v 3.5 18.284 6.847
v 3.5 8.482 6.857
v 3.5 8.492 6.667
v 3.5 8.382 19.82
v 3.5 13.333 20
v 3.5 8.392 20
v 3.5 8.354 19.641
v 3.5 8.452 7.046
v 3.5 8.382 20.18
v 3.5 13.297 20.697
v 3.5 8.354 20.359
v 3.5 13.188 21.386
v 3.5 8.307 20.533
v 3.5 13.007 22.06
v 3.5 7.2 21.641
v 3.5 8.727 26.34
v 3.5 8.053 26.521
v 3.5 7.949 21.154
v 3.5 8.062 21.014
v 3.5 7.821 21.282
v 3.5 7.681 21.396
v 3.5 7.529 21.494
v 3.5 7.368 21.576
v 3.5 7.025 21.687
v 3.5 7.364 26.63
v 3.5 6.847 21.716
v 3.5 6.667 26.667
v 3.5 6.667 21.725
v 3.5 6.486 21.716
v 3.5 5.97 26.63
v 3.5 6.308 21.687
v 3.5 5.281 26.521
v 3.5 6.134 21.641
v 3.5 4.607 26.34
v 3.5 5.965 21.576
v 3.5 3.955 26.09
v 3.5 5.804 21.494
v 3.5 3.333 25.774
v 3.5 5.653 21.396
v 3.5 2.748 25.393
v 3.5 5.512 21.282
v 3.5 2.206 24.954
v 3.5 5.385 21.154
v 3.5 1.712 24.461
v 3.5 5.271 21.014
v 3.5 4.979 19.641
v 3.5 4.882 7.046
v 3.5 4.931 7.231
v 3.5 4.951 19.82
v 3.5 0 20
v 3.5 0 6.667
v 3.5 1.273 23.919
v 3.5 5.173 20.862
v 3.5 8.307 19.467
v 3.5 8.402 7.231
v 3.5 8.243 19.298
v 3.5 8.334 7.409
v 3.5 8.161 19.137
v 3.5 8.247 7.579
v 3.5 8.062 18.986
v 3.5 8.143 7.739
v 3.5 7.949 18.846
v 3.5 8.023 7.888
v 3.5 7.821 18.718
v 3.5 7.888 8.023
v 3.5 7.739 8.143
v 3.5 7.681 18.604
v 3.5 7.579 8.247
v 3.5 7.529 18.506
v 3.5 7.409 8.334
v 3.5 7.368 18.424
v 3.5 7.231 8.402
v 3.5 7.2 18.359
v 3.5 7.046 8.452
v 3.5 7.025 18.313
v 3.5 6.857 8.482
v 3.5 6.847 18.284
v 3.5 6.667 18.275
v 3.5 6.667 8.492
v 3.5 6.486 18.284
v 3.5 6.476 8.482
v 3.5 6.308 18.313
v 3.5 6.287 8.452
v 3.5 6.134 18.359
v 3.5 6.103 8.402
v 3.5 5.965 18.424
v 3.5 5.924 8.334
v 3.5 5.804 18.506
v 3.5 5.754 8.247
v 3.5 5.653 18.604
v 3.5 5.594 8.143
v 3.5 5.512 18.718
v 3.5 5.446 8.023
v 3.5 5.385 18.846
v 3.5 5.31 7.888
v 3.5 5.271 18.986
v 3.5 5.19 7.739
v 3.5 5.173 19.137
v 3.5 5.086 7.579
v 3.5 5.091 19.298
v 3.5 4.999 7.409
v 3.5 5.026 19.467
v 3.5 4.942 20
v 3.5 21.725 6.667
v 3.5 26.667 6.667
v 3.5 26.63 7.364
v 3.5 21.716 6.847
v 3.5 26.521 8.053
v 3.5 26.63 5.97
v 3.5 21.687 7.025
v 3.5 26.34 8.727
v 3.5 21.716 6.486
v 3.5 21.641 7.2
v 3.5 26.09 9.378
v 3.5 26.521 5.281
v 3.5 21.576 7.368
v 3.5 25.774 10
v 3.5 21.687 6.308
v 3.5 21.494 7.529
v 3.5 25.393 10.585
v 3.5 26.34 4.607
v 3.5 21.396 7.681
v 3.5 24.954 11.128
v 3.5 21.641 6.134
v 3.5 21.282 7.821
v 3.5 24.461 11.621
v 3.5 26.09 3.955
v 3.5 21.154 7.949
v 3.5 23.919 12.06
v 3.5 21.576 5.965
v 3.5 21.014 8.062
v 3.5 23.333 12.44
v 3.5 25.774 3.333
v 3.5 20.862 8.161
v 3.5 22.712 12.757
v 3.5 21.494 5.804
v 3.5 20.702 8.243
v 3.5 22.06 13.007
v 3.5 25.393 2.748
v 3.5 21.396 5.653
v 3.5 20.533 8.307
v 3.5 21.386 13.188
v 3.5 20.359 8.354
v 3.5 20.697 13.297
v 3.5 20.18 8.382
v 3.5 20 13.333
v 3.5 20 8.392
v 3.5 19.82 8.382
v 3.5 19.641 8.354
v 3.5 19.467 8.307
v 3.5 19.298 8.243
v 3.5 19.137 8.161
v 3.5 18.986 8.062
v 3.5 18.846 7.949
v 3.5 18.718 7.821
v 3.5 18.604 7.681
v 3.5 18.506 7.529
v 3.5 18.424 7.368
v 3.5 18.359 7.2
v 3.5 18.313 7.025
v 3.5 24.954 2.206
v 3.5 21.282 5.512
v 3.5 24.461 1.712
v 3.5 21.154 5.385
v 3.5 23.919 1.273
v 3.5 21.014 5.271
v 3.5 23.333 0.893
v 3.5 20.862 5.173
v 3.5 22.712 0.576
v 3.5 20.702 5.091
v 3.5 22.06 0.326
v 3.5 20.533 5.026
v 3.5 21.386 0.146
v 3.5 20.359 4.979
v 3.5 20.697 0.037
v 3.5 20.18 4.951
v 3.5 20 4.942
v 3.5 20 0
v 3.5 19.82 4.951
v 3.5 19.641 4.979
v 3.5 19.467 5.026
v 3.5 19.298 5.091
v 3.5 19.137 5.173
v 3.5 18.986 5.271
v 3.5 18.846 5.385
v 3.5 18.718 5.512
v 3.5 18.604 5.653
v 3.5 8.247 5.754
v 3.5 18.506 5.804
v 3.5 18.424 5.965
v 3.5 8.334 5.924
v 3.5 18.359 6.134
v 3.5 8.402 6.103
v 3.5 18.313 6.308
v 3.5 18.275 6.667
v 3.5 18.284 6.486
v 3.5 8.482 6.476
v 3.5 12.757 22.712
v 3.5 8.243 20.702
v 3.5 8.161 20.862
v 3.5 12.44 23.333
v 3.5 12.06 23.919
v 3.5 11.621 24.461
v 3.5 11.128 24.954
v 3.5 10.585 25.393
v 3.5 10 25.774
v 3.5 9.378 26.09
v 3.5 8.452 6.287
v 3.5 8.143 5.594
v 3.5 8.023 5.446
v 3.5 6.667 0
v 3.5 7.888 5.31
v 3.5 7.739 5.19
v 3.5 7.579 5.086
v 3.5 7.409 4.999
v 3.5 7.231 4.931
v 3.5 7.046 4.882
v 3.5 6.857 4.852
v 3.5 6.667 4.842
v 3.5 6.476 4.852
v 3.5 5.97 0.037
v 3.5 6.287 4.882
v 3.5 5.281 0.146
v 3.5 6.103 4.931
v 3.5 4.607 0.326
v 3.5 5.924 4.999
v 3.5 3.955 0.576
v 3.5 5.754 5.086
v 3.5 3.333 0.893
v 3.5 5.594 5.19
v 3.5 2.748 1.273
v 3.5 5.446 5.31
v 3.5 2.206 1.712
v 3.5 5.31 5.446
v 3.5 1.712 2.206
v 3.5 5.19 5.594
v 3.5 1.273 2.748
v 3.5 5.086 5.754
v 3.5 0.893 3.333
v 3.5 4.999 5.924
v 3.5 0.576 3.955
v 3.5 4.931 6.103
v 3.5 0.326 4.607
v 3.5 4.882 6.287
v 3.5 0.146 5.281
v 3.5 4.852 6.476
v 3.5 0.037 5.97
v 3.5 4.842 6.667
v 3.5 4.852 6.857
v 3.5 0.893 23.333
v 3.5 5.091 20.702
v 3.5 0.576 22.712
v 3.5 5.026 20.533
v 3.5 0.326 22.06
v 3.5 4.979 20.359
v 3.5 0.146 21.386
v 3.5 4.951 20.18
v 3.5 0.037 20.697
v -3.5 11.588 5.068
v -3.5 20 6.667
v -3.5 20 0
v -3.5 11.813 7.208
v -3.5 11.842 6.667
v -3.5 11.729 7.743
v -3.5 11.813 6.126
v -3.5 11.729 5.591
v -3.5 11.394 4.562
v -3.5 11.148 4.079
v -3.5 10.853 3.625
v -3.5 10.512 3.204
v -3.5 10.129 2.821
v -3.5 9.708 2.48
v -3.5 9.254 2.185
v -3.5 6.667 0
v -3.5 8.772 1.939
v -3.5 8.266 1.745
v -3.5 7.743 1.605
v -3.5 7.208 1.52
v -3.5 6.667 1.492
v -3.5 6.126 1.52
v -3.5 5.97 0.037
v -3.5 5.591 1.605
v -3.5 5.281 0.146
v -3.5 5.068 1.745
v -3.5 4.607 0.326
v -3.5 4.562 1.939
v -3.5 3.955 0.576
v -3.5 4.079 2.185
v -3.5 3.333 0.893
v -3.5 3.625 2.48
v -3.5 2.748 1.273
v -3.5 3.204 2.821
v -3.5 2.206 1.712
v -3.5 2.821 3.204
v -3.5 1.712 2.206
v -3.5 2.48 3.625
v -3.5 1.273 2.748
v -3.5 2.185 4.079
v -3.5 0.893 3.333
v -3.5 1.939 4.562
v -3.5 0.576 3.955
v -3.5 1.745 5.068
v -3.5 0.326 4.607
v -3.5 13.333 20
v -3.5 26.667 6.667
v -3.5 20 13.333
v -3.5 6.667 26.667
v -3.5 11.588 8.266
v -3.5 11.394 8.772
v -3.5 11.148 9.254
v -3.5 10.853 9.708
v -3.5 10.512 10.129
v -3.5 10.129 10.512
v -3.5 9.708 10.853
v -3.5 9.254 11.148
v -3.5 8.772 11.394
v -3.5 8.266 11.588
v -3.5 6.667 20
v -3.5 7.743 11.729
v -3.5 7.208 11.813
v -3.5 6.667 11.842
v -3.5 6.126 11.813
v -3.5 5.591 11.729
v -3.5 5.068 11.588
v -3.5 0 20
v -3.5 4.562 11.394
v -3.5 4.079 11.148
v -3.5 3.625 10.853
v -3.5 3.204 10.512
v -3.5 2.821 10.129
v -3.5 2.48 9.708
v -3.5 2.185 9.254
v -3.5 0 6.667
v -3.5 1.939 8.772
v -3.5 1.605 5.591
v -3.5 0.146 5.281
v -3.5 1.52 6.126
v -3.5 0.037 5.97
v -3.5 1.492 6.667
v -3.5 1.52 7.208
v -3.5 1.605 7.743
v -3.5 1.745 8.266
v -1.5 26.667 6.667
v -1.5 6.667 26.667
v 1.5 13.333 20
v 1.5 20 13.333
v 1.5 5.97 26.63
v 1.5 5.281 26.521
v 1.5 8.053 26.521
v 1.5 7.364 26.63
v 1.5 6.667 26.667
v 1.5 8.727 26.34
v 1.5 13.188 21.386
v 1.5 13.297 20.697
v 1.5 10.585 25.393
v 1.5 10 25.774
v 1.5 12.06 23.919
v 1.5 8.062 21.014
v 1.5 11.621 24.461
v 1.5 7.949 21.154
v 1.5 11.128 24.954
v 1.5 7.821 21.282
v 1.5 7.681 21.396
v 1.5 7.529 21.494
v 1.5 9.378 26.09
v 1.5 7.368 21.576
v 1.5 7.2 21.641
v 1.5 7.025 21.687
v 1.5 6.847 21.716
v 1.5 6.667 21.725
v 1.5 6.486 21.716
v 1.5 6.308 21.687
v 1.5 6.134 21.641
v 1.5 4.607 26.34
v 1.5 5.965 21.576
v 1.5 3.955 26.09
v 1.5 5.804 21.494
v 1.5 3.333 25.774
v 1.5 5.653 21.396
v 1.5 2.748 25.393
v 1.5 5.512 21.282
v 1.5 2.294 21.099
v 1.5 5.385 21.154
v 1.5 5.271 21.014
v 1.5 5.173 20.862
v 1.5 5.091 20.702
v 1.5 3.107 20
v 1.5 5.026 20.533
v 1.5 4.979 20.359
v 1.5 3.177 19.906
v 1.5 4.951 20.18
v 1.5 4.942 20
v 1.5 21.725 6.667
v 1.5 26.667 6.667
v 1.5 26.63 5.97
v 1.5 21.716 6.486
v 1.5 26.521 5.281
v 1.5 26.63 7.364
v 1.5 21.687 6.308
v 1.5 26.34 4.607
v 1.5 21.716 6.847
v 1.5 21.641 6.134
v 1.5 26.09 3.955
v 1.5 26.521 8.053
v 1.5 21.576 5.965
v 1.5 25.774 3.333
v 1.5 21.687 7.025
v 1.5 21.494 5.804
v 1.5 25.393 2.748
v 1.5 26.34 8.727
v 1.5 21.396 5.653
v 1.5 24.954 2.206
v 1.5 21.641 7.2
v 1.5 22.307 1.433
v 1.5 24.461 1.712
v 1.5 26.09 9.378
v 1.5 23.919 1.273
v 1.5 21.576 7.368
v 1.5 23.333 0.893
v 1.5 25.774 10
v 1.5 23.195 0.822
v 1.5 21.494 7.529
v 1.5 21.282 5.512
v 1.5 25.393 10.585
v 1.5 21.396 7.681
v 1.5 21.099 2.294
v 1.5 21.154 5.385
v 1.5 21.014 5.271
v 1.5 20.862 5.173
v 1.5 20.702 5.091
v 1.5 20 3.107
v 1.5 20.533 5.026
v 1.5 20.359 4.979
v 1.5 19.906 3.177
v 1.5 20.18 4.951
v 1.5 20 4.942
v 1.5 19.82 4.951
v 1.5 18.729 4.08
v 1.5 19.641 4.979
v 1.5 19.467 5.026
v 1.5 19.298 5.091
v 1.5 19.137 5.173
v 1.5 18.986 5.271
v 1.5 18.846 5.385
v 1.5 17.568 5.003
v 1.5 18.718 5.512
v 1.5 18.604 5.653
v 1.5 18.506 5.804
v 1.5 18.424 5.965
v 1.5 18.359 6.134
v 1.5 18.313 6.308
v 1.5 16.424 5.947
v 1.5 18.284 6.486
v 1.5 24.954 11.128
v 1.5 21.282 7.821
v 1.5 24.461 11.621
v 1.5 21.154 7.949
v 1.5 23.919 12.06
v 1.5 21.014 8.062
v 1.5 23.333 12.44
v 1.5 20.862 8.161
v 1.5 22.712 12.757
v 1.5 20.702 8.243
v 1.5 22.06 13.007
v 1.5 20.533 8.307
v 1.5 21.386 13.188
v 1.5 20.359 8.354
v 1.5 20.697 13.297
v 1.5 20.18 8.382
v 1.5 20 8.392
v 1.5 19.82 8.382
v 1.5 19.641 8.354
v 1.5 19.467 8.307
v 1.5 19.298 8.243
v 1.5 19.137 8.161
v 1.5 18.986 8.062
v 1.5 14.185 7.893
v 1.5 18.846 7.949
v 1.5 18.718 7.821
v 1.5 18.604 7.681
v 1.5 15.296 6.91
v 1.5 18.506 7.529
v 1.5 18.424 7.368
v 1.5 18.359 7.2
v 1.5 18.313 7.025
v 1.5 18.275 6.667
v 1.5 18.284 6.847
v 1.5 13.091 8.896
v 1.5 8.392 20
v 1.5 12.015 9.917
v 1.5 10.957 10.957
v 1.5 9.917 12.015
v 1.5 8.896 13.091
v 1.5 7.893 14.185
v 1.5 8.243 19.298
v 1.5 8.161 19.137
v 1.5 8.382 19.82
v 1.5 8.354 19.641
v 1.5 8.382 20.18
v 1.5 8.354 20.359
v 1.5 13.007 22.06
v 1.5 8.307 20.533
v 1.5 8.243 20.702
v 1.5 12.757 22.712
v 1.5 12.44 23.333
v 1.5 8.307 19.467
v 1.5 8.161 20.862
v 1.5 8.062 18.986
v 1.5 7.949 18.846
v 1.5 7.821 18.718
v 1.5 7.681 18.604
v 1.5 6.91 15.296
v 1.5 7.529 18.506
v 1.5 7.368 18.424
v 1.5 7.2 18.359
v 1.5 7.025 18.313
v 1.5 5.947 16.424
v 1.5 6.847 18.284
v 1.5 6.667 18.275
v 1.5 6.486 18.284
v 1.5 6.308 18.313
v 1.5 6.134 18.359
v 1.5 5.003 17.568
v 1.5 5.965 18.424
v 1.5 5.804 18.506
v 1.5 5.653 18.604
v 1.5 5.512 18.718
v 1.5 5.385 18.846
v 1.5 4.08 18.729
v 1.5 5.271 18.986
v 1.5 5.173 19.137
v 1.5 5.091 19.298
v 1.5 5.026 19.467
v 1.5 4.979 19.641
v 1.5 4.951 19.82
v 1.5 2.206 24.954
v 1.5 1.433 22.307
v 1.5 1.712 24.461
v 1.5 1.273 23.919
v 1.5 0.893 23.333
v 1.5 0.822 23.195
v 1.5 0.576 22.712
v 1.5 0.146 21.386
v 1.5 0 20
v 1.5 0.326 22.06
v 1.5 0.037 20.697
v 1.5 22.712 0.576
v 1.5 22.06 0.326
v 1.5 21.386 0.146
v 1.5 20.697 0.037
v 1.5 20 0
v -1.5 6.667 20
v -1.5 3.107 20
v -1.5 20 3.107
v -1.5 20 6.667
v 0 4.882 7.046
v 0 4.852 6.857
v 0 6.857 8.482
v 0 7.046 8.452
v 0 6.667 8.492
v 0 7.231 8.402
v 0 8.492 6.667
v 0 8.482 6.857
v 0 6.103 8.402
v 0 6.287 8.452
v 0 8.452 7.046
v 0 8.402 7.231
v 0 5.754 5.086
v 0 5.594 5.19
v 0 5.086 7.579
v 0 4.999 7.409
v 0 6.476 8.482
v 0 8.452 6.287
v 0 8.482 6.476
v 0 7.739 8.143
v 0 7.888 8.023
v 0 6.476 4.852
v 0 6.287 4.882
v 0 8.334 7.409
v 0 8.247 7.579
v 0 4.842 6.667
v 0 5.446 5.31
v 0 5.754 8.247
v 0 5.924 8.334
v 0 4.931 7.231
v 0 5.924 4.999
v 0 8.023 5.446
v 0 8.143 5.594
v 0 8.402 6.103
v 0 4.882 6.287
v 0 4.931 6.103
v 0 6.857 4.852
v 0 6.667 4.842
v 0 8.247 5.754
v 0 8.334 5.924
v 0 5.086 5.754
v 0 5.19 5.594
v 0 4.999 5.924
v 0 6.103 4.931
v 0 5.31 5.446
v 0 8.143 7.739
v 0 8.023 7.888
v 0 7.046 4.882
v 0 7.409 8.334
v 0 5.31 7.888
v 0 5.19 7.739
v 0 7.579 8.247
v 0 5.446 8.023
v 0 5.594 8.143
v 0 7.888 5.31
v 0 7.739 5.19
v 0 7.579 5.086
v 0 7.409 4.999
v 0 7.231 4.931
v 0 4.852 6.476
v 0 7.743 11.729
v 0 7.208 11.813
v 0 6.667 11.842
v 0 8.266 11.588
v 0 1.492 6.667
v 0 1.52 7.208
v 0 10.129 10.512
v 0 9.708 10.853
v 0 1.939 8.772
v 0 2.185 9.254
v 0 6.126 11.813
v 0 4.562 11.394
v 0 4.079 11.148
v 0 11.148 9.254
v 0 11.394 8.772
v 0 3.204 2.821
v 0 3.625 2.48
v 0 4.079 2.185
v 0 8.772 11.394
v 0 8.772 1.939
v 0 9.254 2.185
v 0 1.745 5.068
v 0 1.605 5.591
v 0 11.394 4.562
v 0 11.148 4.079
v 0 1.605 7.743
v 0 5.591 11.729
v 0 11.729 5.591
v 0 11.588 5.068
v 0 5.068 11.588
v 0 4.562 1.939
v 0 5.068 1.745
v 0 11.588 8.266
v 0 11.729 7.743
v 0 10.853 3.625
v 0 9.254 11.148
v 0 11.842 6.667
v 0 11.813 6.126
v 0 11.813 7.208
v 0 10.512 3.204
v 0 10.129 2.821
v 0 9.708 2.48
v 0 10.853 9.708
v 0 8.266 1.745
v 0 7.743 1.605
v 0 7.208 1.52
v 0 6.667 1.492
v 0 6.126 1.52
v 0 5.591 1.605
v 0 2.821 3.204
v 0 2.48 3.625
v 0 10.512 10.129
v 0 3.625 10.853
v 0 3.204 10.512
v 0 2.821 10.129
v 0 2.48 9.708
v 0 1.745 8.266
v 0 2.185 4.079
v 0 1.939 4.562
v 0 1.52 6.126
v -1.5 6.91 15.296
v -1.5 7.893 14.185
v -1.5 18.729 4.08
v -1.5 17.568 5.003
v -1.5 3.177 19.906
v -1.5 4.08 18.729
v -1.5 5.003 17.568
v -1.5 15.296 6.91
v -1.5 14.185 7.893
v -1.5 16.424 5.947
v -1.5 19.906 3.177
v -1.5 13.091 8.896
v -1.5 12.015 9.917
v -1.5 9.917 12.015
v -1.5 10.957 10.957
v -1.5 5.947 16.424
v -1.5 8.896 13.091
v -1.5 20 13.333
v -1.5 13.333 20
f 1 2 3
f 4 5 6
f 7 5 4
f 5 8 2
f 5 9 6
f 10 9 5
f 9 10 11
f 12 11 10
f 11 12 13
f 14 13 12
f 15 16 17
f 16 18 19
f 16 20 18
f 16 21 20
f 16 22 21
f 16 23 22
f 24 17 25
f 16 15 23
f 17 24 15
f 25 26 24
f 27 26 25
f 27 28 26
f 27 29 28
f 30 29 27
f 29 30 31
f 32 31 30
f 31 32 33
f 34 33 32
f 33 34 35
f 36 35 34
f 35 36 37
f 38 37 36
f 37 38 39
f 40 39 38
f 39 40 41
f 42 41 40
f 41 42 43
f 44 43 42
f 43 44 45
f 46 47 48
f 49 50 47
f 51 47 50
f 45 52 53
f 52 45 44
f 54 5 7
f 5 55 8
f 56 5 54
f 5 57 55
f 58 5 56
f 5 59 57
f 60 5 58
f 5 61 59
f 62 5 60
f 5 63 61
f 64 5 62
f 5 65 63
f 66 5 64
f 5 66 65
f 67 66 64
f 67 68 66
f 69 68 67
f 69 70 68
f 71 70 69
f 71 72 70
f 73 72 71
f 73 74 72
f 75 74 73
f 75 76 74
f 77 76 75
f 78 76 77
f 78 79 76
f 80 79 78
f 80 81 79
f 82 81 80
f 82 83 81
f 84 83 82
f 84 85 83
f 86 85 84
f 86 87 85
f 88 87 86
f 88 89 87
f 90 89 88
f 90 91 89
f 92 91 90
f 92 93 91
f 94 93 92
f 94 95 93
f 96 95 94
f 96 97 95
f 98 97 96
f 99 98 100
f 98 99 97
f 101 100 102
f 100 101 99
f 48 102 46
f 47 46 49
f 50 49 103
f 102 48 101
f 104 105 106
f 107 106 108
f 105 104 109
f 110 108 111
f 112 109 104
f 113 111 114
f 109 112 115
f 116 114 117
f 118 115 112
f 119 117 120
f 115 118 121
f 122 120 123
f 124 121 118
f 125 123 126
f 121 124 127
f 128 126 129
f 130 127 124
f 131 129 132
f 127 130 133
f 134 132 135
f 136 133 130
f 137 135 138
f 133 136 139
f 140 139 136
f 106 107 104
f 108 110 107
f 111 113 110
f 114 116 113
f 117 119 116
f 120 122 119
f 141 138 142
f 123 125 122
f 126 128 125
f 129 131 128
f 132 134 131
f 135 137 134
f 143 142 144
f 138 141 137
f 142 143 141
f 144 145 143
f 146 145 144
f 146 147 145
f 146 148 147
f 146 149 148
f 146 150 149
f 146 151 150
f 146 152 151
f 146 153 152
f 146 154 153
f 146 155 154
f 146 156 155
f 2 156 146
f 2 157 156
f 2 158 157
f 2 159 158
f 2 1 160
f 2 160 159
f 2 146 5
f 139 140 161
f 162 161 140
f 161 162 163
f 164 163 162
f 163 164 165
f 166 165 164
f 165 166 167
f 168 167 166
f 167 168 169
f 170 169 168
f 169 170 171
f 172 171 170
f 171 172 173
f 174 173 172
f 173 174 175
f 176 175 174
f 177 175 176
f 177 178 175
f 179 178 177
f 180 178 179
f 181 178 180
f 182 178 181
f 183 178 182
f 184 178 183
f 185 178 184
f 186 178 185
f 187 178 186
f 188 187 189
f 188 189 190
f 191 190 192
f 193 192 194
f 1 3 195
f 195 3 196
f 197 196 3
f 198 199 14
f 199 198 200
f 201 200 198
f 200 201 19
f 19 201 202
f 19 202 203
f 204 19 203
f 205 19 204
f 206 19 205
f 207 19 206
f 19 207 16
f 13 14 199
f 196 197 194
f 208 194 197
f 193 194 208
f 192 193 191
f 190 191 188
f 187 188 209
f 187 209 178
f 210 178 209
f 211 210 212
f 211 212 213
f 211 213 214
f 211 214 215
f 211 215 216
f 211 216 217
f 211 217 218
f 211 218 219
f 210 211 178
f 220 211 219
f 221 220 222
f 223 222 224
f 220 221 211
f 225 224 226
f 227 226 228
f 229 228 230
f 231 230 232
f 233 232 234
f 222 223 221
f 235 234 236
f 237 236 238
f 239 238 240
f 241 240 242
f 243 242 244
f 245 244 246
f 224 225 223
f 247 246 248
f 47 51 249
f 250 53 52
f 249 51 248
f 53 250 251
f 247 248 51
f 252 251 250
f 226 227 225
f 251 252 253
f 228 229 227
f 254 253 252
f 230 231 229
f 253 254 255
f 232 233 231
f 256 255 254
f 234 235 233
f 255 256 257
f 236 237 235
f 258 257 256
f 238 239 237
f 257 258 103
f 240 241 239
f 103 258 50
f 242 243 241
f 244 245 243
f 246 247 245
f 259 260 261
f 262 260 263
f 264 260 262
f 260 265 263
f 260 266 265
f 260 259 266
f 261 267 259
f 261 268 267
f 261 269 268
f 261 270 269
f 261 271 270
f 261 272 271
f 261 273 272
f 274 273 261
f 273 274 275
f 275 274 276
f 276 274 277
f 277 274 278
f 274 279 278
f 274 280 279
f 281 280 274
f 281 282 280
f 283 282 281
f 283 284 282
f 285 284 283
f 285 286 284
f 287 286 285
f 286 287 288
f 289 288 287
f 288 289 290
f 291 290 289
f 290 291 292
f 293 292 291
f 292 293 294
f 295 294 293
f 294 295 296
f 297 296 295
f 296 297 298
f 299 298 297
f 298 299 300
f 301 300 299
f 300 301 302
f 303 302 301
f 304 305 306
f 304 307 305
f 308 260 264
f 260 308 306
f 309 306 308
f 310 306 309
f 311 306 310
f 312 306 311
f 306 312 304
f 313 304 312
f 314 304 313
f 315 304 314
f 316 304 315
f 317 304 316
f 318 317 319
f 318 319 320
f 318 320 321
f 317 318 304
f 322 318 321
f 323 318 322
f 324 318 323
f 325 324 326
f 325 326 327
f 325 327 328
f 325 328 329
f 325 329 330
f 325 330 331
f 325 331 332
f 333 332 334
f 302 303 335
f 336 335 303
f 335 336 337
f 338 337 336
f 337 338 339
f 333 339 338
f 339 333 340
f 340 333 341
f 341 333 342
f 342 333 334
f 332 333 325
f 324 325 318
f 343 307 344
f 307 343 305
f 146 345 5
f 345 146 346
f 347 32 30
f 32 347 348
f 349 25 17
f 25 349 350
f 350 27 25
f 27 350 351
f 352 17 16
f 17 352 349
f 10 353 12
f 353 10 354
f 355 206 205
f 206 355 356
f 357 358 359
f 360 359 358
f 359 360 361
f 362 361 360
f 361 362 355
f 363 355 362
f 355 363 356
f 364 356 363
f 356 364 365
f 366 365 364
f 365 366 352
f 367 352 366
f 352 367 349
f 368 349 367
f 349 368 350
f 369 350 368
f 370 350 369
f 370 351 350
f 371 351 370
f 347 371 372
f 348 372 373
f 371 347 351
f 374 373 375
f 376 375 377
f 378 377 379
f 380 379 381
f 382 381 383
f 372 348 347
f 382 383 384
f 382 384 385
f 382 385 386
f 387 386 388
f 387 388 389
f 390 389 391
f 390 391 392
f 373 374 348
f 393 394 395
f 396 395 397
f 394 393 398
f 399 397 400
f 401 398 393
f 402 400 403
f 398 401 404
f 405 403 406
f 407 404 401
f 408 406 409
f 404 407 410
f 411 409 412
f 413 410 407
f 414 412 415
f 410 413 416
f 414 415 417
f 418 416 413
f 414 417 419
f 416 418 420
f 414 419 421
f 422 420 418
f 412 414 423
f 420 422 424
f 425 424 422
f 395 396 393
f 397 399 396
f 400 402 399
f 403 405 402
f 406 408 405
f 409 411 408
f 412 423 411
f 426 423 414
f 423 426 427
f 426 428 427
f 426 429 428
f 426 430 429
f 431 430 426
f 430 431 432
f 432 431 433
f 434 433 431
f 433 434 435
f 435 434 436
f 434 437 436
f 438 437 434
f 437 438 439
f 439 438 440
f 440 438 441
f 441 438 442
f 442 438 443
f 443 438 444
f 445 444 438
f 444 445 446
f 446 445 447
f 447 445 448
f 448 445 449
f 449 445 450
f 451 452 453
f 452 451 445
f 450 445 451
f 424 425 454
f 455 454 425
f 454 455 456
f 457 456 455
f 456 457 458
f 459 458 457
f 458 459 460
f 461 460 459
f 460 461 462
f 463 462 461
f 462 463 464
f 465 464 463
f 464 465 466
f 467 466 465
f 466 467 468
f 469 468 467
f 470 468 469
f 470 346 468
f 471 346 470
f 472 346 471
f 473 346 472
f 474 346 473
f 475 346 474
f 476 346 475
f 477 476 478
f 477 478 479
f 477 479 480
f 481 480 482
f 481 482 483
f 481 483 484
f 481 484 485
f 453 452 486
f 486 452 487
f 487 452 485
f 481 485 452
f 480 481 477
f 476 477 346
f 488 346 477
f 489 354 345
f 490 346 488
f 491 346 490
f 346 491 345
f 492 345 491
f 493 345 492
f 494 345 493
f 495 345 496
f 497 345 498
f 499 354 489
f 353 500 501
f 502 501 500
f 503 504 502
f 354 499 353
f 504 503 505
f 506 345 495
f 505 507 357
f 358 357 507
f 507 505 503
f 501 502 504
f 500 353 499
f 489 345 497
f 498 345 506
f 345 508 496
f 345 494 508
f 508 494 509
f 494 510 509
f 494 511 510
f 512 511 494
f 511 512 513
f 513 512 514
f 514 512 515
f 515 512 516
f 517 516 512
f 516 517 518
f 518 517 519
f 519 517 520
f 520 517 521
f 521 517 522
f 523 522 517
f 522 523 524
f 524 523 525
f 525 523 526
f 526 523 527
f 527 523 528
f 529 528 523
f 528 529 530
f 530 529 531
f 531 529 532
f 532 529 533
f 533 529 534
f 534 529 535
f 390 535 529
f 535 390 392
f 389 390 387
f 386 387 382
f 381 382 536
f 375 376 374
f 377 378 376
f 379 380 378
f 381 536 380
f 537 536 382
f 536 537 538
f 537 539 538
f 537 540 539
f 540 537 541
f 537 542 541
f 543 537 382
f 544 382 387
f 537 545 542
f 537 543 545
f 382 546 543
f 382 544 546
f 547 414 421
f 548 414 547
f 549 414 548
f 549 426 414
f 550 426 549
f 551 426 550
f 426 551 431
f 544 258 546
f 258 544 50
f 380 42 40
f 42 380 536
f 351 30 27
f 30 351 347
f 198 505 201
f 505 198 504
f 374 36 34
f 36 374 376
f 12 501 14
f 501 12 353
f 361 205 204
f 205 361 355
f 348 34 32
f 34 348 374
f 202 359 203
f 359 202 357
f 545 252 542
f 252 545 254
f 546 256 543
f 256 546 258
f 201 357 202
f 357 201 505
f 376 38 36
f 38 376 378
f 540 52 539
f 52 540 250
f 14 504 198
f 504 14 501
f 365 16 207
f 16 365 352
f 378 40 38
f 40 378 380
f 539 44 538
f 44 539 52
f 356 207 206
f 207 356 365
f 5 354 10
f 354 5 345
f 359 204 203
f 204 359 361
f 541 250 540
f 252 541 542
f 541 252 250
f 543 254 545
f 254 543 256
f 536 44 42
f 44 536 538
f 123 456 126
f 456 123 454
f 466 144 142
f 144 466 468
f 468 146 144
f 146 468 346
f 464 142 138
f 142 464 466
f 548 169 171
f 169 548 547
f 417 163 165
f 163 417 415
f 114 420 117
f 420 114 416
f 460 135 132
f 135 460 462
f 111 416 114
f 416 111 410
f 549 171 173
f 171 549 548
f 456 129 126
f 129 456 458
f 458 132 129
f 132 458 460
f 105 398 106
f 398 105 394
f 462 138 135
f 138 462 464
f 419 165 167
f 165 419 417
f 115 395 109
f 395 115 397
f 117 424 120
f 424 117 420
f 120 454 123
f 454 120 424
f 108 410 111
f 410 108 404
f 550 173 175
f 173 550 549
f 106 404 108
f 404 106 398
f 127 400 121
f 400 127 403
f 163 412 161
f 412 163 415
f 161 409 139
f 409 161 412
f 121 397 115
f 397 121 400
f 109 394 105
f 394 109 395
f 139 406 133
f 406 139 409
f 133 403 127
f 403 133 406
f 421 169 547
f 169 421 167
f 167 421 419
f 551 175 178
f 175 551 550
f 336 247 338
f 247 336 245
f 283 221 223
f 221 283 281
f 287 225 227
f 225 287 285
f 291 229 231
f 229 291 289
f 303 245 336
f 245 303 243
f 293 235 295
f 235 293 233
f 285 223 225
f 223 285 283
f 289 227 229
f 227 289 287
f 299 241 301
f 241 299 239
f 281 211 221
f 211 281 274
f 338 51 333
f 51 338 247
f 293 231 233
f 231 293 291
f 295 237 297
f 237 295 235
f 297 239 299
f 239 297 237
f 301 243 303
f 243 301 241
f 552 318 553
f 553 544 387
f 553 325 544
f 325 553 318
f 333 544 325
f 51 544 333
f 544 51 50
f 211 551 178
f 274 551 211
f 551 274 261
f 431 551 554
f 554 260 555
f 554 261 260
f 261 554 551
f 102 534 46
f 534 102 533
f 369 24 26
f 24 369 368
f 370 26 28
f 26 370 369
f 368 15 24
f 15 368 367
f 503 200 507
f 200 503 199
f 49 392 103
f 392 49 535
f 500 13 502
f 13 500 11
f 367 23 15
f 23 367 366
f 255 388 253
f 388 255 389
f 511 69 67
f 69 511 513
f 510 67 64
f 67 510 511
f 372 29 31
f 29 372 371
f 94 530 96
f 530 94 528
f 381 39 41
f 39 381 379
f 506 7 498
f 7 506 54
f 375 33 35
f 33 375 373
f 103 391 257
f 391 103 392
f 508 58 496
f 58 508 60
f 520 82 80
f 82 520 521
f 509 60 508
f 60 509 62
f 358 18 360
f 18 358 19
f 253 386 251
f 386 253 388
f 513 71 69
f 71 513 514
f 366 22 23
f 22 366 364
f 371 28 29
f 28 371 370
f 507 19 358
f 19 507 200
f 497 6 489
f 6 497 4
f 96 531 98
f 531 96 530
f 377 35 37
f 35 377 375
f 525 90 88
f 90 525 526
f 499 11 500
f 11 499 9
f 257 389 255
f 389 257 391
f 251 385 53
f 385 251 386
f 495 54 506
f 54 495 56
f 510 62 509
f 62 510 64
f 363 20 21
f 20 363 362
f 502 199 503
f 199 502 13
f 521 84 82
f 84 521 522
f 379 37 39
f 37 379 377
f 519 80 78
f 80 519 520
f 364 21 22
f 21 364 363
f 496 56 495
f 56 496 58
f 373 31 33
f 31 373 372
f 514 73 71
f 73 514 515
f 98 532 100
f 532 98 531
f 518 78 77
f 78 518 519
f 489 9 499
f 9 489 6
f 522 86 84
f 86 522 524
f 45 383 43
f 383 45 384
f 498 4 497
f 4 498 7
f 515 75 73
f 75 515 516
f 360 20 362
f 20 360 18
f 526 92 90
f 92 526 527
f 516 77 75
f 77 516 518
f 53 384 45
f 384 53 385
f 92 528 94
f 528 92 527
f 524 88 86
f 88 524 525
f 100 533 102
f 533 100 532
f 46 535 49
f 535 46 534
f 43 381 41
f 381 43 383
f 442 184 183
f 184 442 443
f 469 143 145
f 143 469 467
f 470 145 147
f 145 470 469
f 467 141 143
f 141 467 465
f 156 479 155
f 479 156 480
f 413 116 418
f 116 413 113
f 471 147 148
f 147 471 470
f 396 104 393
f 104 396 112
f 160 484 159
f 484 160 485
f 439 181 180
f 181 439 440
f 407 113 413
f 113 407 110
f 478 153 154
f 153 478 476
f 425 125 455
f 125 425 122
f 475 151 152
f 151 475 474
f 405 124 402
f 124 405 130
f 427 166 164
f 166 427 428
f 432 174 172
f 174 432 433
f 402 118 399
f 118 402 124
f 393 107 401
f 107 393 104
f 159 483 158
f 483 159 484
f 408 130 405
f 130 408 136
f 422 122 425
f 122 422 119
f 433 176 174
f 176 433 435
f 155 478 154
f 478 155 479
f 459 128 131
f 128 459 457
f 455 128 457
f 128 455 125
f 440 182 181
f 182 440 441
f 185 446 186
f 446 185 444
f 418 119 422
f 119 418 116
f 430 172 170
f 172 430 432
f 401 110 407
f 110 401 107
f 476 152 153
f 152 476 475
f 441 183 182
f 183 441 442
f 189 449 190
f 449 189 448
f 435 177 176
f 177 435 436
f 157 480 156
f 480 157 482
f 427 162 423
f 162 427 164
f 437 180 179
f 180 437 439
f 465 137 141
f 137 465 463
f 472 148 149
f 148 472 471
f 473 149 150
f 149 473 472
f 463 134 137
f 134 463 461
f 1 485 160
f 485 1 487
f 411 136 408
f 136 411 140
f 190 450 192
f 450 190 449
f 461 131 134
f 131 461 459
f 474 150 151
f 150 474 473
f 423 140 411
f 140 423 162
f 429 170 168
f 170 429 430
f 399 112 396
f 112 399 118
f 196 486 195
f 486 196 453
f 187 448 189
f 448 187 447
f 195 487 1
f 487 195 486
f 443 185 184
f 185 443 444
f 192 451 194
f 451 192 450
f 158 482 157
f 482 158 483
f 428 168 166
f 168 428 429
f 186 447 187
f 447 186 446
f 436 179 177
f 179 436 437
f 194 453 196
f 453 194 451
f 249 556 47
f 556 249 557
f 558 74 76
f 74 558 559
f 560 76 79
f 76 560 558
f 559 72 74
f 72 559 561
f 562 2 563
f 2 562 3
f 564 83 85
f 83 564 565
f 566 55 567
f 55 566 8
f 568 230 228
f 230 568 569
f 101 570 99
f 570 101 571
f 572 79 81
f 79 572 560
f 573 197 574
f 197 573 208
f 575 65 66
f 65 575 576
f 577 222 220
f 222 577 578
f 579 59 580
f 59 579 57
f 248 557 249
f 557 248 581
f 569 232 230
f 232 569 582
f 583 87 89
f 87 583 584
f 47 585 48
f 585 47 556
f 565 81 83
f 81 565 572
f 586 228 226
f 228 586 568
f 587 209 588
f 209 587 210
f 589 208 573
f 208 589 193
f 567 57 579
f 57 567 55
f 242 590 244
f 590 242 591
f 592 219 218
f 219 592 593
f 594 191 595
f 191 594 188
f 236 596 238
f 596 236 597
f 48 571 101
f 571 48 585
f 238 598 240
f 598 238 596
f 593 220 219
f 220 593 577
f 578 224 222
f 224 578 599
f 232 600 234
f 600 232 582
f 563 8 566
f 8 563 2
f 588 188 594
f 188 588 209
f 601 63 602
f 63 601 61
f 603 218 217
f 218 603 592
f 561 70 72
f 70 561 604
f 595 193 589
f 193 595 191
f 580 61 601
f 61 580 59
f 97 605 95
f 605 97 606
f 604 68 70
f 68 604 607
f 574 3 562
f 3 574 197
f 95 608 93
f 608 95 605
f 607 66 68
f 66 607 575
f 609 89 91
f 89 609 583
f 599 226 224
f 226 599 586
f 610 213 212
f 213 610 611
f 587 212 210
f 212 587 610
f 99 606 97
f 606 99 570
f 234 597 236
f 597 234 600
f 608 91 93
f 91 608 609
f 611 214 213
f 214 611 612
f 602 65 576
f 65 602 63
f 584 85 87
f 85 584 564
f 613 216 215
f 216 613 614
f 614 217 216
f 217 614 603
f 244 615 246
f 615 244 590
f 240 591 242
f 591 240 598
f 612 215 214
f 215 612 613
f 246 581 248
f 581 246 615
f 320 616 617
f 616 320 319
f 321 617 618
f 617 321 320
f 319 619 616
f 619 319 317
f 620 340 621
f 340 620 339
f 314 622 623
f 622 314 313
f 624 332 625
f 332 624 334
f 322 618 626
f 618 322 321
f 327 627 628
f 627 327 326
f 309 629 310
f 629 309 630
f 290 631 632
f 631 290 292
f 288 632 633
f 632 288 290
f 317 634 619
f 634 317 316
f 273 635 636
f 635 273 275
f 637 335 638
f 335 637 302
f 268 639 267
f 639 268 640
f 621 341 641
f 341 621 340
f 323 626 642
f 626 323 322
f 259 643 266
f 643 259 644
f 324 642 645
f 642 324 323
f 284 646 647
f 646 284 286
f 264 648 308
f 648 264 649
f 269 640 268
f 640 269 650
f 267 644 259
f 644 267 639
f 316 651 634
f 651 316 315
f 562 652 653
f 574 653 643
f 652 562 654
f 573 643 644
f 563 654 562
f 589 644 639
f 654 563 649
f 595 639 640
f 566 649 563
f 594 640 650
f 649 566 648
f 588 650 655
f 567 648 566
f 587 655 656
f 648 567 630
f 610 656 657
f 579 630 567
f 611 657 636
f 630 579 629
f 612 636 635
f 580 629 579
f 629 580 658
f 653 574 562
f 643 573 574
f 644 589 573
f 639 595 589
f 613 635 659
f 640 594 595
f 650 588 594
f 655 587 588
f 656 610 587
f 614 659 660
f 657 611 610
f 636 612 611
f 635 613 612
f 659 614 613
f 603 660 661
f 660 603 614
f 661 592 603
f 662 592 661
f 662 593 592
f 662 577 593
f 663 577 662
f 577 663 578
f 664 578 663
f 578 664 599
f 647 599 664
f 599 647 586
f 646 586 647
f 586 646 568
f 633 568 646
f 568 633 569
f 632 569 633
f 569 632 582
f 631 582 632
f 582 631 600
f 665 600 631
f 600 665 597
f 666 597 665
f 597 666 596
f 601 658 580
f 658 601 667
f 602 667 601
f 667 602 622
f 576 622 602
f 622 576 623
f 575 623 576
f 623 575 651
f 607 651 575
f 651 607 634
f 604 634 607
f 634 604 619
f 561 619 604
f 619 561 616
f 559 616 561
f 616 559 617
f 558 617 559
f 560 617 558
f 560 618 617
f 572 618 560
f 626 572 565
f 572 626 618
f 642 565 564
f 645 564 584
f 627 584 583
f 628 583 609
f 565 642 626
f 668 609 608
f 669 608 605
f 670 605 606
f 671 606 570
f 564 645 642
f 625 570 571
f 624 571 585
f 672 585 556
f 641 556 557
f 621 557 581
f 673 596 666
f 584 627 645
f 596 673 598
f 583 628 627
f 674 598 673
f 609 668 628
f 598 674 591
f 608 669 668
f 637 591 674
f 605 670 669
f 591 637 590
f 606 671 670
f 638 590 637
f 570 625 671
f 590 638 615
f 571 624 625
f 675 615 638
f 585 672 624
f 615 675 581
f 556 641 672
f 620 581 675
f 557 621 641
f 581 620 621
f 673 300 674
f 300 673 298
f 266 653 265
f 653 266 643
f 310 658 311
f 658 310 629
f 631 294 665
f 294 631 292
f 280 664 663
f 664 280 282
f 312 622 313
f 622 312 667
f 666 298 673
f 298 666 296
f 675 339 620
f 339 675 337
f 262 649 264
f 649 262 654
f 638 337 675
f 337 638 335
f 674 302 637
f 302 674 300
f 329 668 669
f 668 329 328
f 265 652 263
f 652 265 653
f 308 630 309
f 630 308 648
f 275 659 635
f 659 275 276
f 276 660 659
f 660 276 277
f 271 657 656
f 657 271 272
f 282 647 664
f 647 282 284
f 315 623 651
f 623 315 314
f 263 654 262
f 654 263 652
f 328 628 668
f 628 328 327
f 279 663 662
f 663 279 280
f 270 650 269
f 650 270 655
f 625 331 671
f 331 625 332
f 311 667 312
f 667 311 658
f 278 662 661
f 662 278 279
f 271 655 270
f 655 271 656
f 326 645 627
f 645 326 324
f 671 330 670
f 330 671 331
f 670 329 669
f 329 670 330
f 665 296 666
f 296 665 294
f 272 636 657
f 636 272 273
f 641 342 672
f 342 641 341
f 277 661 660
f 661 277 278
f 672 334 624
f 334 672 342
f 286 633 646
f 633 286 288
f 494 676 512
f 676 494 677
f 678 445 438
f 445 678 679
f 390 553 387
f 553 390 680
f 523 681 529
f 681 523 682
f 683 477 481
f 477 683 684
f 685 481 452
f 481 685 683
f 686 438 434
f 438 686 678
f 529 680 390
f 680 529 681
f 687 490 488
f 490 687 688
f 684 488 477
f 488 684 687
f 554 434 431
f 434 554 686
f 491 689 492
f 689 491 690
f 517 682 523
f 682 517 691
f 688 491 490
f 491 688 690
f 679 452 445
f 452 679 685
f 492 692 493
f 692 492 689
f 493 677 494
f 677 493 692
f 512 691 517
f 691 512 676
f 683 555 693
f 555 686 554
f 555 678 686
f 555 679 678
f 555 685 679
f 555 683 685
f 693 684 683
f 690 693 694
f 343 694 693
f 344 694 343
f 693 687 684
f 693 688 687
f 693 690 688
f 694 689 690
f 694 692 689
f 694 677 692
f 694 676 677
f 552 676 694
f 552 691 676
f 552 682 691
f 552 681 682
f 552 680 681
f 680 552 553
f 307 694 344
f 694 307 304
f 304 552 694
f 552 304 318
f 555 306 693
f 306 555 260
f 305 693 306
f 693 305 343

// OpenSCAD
// file: configuration.scad
// Increase this if your slicer or printer make holes too tight.
extra_radius = 0.1;

// OD = outside diameter, corner to corner.
m3_nut_od = 6.1;
m3_nut_radius = m3_nut_od/2 + 0.2 + extra_radius;
m3_washer_radius = 3.5 + extra_radius;

// Major diameter of metric 3mm thread.
m3_major = 2.85;
m3_radius = m3_major/2 + extra_radius;
m3_wide_radius = m3_major/2 + extra_radius + 0.2;

// NEMA17 stepper motors.
motor_shaft_diameter = 5;
motor_shaft_radius = motor_shaft_diameter/2 + extra_radius;

// Frame brackets. M3x8mm screws work best with 3.6 mm brackets.
thickness = 3.6;

// OpenBeam or Misumi. Currently only 15x15 mm, but there is a plan
// to make models more parametric and allow 20x20 mm in the future.
extrusion = 15;

// Placement for the NEMA17 stepper motors.
motor_offset = 44;
motor_length = 47;
// file: triangle.scad
//triangle.scad
/*         C
           .
          / \
       b /   \ a
        /     \
      A.-------.B
           c
   Triangle referenced in these modules:
   side c is the base opposite angle C
   b is the upper left side opposite angle B
   a is the upper right side opposite angle A
   angle A will be at the origin
	center moves the triangle down half its height
*/
// usage: rTriangle(center=true);
module rTriangle(c=8, b=4, h=1, center=false){
  rightTriangle(c, b, h, center);
}
module rightTriangle(c=3, b=4, h=1, center=false)
{// b is y, c is x 
  q = center==true ? 1 : 0;
  translate([0, 0, -q*h/2])
  linear_extrude(height=h)
  polygon(points=[[0,0],[0,b],[c,0]],paths=[[0,1,2]]);
}

// usage: hlTriangle(center=true);
module hlTriangle(hyp=8, leg=4, h=1, center=false){
  hypotenuseLegTriangle(hyp, leg, h, center);
}//leg is the y, s the x
module hypotenuseLegTriangle(hyp=5, leg=4, h=1, center=false){
  s=sqrt(hyp*hyp-leg*leg);
  rightTriangle(s, leg, h, center);
}

// usage: iTriangle(5,30,1,true);
module iTriangle(side=5, angle=30, h=1, center=false){
  isoscelesTriangle(side, angle, h, center);
}
module isoscelesTriangle(side=5, angle=30, h=1, center=false){// side is the length of the egual sides of the included angle
  q = center==true ? 1 : 0;
  baseAngle=(180-angle)/2;
  y=side*sin(baseAngle);
  x=2*side*sin(angle/2);

  translate([0, 0, -q*h/2])
  linear_extrude(height=h)
  polygon(points=[[0,0],[x/2,y],[x,0]],paths=[ [0,1,2] ]);
}

// usage: eTriangle(5,1,true);
module eTriangle(side=5, h=1, center=false){
  equilateralTriangle(side, h, center);
}//Equilateral triangle is special case isosceles triangle.
module equilateralTriangle(side=5, h=1, center=false){
  isoscelesTriangle(side, 60, h, center);
}

// usage: sasTriangle(center=true);
module sasTriangle(b=6, A=120, c=5, h=1, center=false){
  // c is the base of the triangle
  // b is the upper left side
  // A is the included A
  q = center==true ? 1 : 0;
  
  translate([0,0,-h/2*q])
  linear_extrude(height=h)
  if (A <= 90){
    polygon(points=[[0,0],[b*cos(A),b*sin(A)],[c,0]],paths=[ [0,1,2] ]);
  }else{ // > 90
    polygon(points=[[0,0],[-b*cos(180-A),b*sin(180-A)],[c,0]],paths=[[0,1,2]]);
  }
}

// usage: asaTriangle(center=true);
module asaTriangle(A=120, c=4, B=30, h=1, center=false){// arbitrarly the first angle is the left one upper of the 4 possible positions.
  C = 180 - A - B;//third angle opposite side c.
  // Law of sines: b/sin(B) = c/sin(C) so:
  b = c*sin(B)/sin(C);

  sasTriangle(b,A,c,h,center);  
}

// usage: sssTriangle(center=true);
module sssTriangle(a=6,b=3,c=8,h=1,center=false){
  // sum of a and b must be larger than c
  // law of cosines: 
  A = acos((b*b + c*c - a*a)/(2*b*c));

  sasTriangle(b,A,c,h,center);
}

//usage: trapezoid(center=true);
module trapezoid(th=6, tw=15, eh=10, alpha=60, center=false){
	/* regular trapezoid
	th=trapezoid height
   tw=trapezoid major side width
	eh=extrusion height
   alpha=degree measure of acute angles
   */
	// Included with triangles since a trapezoid is a truncated triangle...  ;)
	x=th/tan(alpha);

	if(center==true){
		translate([-tw/2,0,-eh/2])
		linear_extrude(height=eh) 
		polygon(points=[ [0,0],[x,th],[tw-x,th],[tw,0] ],
				  paths=[ [0,1,2,3] ]);
	} else {
		linear_extrude(height=eh) 
		polygon(points=[ [0,0],[x,th],[tw-x,th],[tw,0] ],
				  paths=[ [0,1,2,3] ]);
	}
}
// main file
include <triangle.scad>
include <configuration.scad>

plate_radius=170/2;
plate_height=3;
clip_lip=2;
offset_multiplier=1.32;
clip_thickness=clip_lip*2+plate_height;
triangle_side=20;
triangle_hypotenuse=triangle_side*sqrt(2);
corner_radius=triangle_side/3;
washer_size=m3_wide_radius*3;

rotate([0,-90,0]){
translate([corner_radius,corner_radius,0]){
difference(){
union(){
sssTriangle(triangle_hypotenuse, triangle_side, triangle_side, clip_thickness, center=true);

translate([triangle_side*2/3, 0, -clip_thickness/2])
	cylinder(h=clip_lip, r=corner_radius, $fn=60);

translate([0, triangle_side*2/3, -clip_thickness/2])
	cylinder(h=clip_lip, r=corner_radius, $fn=60);

translate([0, 0, -clip_thickness/2])
	cylinder(h=clip_thickness, r=corner_radius, $fn=60);

translate([0, -corner_radius, -clip_thickness/2])
	cube([corner_radius*2, corner_radius, clip_thickness]);

translate([-corner_radius, 0, -clip_thickness/2])
	cube([corner_radius, corner_radius*2, clip_thickness]);
}

translate([triangle_side*2/3, 0, -clip_thickness/2])
	cylinder(h=clip_lip, r=m3_wide_radius, $fn=60);

translate([0, triangle_side*2/3, -clip_thickness/2])
	cylinder(h=clip_lip, r=m3_wide_radius, $fn=60);

translate([0, 0, -clip_thickness/2])
	cylinder(h=clip_thickness, r=m3_wide_radius+.1, $fn=60);

translate([0, 0, 0])
	cylinder(h=clip_thickness/2, r=washer_size, $fn=60);

translate([plate_radius/offset_multiplier, plate_radius/offset_multiplier, -plate_height/2])
	cylinder(h=plate_height, r=plate_radius, $fn=360);

translate([triangle_side*2/3, 0, plate_height/2])
sssTriangle(corner_radius*sqrt(2), corner_radius, corner_radius, clip_lip);

translate([0, triangle_side*2/3, plate_height/2])
sssTriangle(corner_radius*sqrt(2), corner_radius, corner_radius, clip_lip);
}
}
}
